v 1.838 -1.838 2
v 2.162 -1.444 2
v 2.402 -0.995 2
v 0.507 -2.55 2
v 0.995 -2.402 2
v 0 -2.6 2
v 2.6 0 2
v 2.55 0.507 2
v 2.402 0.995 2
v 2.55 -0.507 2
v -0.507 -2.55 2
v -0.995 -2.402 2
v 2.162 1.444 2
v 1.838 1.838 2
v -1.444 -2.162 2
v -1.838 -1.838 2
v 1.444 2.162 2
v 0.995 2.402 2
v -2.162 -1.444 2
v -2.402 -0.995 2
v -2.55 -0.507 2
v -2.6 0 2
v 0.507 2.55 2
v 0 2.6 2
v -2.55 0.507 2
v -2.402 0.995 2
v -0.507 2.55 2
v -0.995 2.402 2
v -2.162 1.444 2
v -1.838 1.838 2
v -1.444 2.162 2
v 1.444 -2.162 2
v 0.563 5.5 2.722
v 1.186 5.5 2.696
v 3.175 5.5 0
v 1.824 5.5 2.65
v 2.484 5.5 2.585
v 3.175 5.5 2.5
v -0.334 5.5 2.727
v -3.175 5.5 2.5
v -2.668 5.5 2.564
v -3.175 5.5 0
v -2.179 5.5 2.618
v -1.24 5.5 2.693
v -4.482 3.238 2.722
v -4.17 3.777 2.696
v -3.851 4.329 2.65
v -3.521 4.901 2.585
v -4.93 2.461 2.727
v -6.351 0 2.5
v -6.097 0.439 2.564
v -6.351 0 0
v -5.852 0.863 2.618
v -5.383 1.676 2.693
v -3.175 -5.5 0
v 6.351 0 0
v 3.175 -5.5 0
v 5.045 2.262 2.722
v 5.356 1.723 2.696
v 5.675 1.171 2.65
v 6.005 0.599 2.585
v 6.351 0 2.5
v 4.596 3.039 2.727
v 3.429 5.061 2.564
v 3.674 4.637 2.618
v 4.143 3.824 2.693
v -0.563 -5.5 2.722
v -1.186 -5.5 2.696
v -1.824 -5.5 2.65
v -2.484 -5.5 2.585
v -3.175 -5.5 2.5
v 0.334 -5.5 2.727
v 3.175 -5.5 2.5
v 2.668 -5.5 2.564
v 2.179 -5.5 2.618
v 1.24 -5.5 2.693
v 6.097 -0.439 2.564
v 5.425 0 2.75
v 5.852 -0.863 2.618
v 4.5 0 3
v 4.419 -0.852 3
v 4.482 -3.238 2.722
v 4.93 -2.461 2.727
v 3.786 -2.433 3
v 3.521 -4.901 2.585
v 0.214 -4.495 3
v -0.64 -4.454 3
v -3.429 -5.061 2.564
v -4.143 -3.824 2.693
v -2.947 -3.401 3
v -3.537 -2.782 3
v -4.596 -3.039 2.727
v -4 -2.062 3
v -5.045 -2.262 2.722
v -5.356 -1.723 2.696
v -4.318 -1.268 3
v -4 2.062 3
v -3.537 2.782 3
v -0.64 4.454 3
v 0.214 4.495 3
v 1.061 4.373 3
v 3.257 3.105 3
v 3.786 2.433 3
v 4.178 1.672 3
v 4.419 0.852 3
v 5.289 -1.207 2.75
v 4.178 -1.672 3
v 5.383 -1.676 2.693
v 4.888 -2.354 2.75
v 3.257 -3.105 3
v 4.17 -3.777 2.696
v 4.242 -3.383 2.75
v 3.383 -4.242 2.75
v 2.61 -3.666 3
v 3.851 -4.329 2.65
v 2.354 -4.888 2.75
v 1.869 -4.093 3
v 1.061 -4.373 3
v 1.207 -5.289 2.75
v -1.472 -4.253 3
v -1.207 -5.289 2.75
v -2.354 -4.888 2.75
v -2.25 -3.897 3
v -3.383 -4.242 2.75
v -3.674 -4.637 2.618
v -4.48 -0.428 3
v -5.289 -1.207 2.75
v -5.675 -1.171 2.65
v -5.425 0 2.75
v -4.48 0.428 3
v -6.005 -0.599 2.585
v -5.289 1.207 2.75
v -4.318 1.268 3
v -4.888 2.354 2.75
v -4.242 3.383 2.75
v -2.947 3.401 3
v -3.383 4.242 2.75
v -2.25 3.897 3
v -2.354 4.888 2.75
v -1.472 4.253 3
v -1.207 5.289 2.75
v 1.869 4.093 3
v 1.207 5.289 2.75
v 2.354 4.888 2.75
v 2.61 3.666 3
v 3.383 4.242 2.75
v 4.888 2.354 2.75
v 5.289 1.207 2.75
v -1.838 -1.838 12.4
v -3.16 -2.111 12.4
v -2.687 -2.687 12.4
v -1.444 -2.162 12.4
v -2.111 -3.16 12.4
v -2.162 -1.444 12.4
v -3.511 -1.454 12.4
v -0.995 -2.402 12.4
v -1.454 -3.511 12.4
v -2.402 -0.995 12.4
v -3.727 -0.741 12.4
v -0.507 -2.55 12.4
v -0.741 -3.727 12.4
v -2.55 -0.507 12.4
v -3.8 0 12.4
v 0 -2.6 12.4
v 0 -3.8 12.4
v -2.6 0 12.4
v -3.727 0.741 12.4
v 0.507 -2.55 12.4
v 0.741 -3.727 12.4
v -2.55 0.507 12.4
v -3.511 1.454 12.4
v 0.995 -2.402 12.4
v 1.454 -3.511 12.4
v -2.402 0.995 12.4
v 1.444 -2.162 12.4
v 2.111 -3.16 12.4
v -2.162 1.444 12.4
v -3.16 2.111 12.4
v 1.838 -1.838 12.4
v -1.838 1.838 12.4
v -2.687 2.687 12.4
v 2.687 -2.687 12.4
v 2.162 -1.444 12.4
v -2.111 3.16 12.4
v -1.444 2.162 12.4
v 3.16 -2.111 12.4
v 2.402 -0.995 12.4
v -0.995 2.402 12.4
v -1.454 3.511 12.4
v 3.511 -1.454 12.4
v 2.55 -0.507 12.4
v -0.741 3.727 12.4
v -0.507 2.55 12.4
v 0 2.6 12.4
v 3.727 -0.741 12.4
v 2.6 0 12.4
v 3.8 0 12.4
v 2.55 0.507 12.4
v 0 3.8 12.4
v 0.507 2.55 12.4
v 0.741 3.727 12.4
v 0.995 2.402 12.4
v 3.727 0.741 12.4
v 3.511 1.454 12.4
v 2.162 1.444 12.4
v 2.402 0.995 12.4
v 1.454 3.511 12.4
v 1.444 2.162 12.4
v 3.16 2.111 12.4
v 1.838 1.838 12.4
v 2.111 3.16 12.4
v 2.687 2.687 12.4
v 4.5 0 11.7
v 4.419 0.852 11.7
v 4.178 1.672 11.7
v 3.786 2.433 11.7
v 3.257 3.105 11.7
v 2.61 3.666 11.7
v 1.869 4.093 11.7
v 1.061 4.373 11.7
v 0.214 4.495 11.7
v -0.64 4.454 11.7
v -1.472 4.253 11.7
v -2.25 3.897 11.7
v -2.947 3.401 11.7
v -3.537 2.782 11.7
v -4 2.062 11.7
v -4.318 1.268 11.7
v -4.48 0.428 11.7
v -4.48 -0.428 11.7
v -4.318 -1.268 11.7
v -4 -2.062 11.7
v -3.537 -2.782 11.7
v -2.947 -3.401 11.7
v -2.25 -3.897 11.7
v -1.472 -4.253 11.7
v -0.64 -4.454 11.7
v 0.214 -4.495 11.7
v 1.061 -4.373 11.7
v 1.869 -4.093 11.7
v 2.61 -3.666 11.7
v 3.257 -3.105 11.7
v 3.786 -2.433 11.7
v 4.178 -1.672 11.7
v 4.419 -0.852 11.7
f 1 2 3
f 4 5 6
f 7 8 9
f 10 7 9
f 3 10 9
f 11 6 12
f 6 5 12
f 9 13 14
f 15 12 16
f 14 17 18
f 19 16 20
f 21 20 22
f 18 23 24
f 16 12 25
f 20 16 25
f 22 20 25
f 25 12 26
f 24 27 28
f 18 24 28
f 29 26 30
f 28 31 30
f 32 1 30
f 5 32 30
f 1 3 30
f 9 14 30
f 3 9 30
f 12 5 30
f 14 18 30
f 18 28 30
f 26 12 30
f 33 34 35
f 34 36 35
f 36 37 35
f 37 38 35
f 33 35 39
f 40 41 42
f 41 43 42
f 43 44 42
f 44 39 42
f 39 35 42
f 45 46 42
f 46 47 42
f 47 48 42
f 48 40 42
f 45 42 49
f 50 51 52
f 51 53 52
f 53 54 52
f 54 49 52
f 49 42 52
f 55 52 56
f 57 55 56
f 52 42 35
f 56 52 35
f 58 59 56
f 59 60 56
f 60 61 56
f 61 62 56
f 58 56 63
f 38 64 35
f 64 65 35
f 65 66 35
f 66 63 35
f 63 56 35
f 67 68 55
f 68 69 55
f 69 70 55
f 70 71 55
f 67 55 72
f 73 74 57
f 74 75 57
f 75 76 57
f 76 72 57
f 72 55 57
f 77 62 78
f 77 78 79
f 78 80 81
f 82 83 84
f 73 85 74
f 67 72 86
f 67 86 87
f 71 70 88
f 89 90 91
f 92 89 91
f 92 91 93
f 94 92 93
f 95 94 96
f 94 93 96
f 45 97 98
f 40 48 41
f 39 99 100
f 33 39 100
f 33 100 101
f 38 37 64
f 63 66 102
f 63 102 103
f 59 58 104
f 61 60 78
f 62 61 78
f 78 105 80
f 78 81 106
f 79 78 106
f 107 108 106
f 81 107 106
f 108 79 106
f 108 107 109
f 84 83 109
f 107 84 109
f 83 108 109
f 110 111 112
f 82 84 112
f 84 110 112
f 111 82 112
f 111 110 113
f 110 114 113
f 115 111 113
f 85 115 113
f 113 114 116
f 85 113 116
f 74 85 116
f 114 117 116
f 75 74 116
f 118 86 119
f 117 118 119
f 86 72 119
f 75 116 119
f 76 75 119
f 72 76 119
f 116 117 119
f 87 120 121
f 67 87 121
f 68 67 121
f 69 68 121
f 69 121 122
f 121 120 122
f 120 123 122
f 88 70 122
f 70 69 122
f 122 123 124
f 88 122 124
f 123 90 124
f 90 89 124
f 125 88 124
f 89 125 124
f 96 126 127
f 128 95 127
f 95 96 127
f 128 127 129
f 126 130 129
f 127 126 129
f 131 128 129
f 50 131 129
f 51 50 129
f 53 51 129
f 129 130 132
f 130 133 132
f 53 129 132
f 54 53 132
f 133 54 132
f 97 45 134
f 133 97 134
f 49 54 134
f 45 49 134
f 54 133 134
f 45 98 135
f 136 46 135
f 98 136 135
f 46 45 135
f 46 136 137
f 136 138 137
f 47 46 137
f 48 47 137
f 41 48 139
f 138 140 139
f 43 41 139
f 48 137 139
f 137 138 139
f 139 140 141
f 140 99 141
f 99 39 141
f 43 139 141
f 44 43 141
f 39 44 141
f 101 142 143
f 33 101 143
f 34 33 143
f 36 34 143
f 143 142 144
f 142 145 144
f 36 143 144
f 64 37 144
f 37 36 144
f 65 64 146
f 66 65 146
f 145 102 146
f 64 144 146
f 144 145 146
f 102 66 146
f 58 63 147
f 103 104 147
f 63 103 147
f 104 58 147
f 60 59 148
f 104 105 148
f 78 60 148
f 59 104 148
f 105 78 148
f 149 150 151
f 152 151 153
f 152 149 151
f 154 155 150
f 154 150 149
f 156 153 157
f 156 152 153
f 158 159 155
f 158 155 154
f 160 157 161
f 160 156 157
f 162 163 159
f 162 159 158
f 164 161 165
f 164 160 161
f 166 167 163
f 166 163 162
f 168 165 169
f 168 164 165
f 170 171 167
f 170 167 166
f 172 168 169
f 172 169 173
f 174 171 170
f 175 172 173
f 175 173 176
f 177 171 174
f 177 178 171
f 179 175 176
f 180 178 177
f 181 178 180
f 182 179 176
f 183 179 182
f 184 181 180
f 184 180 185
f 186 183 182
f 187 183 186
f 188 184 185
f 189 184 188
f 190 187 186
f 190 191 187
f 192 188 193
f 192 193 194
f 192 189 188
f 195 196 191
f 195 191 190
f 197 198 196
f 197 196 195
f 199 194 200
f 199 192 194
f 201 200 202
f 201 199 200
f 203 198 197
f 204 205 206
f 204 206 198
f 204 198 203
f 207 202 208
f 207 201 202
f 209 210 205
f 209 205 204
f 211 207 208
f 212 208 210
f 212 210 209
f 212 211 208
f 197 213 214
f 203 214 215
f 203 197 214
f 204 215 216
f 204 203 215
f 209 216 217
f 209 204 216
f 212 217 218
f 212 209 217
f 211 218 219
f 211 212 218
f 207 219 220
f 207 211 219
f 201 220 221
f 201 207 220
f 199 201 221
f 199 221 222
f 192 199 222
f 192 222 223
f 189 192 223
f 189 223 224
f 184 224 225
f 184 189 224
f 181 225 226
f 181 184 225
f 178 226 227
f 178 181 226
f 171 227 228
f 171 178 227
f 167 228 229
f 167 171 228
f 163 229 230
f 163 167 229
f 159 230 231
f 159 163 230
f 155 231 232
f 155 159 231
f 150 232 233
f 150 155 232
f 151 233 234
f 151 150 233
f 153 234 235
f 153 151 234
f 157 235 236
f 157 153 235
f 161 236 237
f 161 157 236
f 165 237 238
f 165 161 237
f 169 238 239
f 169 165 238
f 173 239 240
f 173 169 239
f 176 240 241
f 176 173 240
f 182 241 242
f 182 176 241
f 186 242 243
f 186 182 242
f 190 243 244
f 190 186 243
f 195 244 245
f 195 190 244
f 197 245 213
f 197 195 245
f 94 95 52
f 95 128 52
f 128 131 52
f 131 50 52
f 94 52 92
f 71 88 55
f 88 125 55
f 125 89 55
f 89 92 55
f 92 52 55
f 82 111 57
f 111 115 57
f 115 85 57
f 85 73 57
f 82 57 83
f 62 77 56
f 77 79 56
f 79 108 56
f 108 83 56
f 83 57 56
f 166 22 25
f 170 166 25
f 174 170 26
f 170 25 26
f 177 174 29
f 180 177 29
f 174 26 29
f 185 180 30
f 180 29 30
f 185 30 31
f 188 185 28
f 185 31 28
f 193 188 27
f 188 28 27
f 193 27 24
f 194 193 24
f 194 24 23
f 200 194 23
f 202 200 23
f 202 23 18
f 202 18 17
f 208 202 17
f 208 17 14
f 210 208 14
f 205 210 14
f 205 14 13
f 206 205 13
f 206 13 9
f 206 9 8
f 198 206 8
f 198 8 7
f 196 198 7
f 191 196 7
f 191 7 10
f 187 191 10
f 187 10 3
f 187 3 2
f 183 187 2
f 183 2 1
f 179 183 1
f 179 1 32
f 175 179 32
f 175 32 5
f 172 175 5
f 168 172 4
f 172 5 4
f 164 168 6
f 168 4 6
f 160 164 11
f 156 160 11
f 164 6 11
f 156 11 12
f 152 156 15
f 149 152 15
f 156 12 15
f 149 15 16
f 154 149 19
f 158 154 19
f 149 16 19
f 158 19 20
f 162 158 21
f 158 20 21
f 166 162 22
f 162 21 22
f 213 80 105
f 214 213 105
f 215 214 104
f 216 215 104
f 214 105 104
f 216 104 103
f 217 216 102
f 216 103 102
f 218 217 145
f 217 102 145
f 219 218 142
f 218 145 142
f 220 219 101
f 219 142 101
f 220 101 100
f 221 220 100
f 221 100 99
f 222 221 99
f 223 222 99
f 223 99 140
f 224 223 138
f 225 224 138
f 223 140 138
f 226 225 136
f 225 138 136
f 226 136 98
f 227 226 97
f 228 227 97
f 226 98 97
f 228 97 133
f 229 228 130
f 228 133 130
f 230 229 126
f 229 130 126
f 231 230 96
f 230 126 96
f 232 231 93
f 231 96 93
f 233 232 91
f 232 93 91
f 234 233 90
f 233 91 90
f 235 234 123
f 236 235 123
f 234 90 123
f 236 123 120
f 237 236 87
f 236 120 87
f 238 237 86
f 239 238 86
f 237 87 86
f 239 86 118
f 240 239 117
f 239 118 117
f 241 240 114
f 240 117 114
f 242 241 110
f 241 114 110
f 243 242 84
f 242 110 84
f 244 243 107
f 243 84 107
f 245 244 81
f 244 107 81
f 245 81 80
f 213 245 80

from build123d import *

# Parameters (mm, degrees)
BOSS_EXTRUDE1_DEPTH = 3
SKETCH2_R           = 4.5
BOSS_EXTRUDE2_DEPTH = 9.4
CUT_EXTRUDE1_START  = -2
SKETCH3_R           = 2.6
CUT_EXTRUDE1_DEPTH  = 13.978095117
CHAMFER2_SIZE       = 0.7


with BuildPart() as part:
    # Sketch1 → Boss-Extrude1 (new body)
    with BuildSketch(Plane.XY):
        Polygon((6.350852961, 0), (3.175426481, 5.5), (-3.175426481, 5.5), (-6.350852961, 0), (-3.175426481, -5.5), (3.175426481, -5.5), align=None)
    extrude(amount=BOSS_EXTRUDE1_DEPTH)

    # Sketch2 → Boss-Extrude2 (add)
    with BuildSketch(Plane.XY.offset(3)):
        Circle(SKETCH2_R)
    extrude(amount=BOSS_EXTRUDE2_DEPTH)

    # Sketch3 → Cut-Extrude1 (cut, through all)
    with BuildSketch(Plane(origin=(0, 0, 0), x_dir=(-1, 0, 0), z_dir=(0, 0, -1)).offset(CUT_EXTRUDE1_START)):
        Circle(SKETCH3_R)
    extrude(amount=-CUT_EXTRUDE1_DEPTH, mode=Mode.SUBTRACT)

    # Sketch5 → Cut-Revolve2 (revolve, cut)
    with BuildSketch(Plane(origin=(0, 0, 0), x_dir=(1, 0, 0), z_dir=(0, 1, 0)), mode=Mode.PRIVATE) as cut_revolve2_sk:
        Polygon((-4.5, -3), (-6.350852961, -3), (-6.350852961, -2.5), align=None)
    revolve(cut_revolve2_sk.sketch.rotate(Axis((0, 0, 12.4), (0, 0, -1)), 180), axis=Axis((0, 0, 12.4), (0, 0, -1)), mode=Mode.SUBTRACT)

    # Chamfer2
    chamfer2_edges = [part.edges().sort_by_distance(p)[0] for p in [
        (-4.5, 0, 12.4),
    ]]
    chamfer(chamfer2_edges, length=CHAMFER2_SIZE)


solid = part.part
